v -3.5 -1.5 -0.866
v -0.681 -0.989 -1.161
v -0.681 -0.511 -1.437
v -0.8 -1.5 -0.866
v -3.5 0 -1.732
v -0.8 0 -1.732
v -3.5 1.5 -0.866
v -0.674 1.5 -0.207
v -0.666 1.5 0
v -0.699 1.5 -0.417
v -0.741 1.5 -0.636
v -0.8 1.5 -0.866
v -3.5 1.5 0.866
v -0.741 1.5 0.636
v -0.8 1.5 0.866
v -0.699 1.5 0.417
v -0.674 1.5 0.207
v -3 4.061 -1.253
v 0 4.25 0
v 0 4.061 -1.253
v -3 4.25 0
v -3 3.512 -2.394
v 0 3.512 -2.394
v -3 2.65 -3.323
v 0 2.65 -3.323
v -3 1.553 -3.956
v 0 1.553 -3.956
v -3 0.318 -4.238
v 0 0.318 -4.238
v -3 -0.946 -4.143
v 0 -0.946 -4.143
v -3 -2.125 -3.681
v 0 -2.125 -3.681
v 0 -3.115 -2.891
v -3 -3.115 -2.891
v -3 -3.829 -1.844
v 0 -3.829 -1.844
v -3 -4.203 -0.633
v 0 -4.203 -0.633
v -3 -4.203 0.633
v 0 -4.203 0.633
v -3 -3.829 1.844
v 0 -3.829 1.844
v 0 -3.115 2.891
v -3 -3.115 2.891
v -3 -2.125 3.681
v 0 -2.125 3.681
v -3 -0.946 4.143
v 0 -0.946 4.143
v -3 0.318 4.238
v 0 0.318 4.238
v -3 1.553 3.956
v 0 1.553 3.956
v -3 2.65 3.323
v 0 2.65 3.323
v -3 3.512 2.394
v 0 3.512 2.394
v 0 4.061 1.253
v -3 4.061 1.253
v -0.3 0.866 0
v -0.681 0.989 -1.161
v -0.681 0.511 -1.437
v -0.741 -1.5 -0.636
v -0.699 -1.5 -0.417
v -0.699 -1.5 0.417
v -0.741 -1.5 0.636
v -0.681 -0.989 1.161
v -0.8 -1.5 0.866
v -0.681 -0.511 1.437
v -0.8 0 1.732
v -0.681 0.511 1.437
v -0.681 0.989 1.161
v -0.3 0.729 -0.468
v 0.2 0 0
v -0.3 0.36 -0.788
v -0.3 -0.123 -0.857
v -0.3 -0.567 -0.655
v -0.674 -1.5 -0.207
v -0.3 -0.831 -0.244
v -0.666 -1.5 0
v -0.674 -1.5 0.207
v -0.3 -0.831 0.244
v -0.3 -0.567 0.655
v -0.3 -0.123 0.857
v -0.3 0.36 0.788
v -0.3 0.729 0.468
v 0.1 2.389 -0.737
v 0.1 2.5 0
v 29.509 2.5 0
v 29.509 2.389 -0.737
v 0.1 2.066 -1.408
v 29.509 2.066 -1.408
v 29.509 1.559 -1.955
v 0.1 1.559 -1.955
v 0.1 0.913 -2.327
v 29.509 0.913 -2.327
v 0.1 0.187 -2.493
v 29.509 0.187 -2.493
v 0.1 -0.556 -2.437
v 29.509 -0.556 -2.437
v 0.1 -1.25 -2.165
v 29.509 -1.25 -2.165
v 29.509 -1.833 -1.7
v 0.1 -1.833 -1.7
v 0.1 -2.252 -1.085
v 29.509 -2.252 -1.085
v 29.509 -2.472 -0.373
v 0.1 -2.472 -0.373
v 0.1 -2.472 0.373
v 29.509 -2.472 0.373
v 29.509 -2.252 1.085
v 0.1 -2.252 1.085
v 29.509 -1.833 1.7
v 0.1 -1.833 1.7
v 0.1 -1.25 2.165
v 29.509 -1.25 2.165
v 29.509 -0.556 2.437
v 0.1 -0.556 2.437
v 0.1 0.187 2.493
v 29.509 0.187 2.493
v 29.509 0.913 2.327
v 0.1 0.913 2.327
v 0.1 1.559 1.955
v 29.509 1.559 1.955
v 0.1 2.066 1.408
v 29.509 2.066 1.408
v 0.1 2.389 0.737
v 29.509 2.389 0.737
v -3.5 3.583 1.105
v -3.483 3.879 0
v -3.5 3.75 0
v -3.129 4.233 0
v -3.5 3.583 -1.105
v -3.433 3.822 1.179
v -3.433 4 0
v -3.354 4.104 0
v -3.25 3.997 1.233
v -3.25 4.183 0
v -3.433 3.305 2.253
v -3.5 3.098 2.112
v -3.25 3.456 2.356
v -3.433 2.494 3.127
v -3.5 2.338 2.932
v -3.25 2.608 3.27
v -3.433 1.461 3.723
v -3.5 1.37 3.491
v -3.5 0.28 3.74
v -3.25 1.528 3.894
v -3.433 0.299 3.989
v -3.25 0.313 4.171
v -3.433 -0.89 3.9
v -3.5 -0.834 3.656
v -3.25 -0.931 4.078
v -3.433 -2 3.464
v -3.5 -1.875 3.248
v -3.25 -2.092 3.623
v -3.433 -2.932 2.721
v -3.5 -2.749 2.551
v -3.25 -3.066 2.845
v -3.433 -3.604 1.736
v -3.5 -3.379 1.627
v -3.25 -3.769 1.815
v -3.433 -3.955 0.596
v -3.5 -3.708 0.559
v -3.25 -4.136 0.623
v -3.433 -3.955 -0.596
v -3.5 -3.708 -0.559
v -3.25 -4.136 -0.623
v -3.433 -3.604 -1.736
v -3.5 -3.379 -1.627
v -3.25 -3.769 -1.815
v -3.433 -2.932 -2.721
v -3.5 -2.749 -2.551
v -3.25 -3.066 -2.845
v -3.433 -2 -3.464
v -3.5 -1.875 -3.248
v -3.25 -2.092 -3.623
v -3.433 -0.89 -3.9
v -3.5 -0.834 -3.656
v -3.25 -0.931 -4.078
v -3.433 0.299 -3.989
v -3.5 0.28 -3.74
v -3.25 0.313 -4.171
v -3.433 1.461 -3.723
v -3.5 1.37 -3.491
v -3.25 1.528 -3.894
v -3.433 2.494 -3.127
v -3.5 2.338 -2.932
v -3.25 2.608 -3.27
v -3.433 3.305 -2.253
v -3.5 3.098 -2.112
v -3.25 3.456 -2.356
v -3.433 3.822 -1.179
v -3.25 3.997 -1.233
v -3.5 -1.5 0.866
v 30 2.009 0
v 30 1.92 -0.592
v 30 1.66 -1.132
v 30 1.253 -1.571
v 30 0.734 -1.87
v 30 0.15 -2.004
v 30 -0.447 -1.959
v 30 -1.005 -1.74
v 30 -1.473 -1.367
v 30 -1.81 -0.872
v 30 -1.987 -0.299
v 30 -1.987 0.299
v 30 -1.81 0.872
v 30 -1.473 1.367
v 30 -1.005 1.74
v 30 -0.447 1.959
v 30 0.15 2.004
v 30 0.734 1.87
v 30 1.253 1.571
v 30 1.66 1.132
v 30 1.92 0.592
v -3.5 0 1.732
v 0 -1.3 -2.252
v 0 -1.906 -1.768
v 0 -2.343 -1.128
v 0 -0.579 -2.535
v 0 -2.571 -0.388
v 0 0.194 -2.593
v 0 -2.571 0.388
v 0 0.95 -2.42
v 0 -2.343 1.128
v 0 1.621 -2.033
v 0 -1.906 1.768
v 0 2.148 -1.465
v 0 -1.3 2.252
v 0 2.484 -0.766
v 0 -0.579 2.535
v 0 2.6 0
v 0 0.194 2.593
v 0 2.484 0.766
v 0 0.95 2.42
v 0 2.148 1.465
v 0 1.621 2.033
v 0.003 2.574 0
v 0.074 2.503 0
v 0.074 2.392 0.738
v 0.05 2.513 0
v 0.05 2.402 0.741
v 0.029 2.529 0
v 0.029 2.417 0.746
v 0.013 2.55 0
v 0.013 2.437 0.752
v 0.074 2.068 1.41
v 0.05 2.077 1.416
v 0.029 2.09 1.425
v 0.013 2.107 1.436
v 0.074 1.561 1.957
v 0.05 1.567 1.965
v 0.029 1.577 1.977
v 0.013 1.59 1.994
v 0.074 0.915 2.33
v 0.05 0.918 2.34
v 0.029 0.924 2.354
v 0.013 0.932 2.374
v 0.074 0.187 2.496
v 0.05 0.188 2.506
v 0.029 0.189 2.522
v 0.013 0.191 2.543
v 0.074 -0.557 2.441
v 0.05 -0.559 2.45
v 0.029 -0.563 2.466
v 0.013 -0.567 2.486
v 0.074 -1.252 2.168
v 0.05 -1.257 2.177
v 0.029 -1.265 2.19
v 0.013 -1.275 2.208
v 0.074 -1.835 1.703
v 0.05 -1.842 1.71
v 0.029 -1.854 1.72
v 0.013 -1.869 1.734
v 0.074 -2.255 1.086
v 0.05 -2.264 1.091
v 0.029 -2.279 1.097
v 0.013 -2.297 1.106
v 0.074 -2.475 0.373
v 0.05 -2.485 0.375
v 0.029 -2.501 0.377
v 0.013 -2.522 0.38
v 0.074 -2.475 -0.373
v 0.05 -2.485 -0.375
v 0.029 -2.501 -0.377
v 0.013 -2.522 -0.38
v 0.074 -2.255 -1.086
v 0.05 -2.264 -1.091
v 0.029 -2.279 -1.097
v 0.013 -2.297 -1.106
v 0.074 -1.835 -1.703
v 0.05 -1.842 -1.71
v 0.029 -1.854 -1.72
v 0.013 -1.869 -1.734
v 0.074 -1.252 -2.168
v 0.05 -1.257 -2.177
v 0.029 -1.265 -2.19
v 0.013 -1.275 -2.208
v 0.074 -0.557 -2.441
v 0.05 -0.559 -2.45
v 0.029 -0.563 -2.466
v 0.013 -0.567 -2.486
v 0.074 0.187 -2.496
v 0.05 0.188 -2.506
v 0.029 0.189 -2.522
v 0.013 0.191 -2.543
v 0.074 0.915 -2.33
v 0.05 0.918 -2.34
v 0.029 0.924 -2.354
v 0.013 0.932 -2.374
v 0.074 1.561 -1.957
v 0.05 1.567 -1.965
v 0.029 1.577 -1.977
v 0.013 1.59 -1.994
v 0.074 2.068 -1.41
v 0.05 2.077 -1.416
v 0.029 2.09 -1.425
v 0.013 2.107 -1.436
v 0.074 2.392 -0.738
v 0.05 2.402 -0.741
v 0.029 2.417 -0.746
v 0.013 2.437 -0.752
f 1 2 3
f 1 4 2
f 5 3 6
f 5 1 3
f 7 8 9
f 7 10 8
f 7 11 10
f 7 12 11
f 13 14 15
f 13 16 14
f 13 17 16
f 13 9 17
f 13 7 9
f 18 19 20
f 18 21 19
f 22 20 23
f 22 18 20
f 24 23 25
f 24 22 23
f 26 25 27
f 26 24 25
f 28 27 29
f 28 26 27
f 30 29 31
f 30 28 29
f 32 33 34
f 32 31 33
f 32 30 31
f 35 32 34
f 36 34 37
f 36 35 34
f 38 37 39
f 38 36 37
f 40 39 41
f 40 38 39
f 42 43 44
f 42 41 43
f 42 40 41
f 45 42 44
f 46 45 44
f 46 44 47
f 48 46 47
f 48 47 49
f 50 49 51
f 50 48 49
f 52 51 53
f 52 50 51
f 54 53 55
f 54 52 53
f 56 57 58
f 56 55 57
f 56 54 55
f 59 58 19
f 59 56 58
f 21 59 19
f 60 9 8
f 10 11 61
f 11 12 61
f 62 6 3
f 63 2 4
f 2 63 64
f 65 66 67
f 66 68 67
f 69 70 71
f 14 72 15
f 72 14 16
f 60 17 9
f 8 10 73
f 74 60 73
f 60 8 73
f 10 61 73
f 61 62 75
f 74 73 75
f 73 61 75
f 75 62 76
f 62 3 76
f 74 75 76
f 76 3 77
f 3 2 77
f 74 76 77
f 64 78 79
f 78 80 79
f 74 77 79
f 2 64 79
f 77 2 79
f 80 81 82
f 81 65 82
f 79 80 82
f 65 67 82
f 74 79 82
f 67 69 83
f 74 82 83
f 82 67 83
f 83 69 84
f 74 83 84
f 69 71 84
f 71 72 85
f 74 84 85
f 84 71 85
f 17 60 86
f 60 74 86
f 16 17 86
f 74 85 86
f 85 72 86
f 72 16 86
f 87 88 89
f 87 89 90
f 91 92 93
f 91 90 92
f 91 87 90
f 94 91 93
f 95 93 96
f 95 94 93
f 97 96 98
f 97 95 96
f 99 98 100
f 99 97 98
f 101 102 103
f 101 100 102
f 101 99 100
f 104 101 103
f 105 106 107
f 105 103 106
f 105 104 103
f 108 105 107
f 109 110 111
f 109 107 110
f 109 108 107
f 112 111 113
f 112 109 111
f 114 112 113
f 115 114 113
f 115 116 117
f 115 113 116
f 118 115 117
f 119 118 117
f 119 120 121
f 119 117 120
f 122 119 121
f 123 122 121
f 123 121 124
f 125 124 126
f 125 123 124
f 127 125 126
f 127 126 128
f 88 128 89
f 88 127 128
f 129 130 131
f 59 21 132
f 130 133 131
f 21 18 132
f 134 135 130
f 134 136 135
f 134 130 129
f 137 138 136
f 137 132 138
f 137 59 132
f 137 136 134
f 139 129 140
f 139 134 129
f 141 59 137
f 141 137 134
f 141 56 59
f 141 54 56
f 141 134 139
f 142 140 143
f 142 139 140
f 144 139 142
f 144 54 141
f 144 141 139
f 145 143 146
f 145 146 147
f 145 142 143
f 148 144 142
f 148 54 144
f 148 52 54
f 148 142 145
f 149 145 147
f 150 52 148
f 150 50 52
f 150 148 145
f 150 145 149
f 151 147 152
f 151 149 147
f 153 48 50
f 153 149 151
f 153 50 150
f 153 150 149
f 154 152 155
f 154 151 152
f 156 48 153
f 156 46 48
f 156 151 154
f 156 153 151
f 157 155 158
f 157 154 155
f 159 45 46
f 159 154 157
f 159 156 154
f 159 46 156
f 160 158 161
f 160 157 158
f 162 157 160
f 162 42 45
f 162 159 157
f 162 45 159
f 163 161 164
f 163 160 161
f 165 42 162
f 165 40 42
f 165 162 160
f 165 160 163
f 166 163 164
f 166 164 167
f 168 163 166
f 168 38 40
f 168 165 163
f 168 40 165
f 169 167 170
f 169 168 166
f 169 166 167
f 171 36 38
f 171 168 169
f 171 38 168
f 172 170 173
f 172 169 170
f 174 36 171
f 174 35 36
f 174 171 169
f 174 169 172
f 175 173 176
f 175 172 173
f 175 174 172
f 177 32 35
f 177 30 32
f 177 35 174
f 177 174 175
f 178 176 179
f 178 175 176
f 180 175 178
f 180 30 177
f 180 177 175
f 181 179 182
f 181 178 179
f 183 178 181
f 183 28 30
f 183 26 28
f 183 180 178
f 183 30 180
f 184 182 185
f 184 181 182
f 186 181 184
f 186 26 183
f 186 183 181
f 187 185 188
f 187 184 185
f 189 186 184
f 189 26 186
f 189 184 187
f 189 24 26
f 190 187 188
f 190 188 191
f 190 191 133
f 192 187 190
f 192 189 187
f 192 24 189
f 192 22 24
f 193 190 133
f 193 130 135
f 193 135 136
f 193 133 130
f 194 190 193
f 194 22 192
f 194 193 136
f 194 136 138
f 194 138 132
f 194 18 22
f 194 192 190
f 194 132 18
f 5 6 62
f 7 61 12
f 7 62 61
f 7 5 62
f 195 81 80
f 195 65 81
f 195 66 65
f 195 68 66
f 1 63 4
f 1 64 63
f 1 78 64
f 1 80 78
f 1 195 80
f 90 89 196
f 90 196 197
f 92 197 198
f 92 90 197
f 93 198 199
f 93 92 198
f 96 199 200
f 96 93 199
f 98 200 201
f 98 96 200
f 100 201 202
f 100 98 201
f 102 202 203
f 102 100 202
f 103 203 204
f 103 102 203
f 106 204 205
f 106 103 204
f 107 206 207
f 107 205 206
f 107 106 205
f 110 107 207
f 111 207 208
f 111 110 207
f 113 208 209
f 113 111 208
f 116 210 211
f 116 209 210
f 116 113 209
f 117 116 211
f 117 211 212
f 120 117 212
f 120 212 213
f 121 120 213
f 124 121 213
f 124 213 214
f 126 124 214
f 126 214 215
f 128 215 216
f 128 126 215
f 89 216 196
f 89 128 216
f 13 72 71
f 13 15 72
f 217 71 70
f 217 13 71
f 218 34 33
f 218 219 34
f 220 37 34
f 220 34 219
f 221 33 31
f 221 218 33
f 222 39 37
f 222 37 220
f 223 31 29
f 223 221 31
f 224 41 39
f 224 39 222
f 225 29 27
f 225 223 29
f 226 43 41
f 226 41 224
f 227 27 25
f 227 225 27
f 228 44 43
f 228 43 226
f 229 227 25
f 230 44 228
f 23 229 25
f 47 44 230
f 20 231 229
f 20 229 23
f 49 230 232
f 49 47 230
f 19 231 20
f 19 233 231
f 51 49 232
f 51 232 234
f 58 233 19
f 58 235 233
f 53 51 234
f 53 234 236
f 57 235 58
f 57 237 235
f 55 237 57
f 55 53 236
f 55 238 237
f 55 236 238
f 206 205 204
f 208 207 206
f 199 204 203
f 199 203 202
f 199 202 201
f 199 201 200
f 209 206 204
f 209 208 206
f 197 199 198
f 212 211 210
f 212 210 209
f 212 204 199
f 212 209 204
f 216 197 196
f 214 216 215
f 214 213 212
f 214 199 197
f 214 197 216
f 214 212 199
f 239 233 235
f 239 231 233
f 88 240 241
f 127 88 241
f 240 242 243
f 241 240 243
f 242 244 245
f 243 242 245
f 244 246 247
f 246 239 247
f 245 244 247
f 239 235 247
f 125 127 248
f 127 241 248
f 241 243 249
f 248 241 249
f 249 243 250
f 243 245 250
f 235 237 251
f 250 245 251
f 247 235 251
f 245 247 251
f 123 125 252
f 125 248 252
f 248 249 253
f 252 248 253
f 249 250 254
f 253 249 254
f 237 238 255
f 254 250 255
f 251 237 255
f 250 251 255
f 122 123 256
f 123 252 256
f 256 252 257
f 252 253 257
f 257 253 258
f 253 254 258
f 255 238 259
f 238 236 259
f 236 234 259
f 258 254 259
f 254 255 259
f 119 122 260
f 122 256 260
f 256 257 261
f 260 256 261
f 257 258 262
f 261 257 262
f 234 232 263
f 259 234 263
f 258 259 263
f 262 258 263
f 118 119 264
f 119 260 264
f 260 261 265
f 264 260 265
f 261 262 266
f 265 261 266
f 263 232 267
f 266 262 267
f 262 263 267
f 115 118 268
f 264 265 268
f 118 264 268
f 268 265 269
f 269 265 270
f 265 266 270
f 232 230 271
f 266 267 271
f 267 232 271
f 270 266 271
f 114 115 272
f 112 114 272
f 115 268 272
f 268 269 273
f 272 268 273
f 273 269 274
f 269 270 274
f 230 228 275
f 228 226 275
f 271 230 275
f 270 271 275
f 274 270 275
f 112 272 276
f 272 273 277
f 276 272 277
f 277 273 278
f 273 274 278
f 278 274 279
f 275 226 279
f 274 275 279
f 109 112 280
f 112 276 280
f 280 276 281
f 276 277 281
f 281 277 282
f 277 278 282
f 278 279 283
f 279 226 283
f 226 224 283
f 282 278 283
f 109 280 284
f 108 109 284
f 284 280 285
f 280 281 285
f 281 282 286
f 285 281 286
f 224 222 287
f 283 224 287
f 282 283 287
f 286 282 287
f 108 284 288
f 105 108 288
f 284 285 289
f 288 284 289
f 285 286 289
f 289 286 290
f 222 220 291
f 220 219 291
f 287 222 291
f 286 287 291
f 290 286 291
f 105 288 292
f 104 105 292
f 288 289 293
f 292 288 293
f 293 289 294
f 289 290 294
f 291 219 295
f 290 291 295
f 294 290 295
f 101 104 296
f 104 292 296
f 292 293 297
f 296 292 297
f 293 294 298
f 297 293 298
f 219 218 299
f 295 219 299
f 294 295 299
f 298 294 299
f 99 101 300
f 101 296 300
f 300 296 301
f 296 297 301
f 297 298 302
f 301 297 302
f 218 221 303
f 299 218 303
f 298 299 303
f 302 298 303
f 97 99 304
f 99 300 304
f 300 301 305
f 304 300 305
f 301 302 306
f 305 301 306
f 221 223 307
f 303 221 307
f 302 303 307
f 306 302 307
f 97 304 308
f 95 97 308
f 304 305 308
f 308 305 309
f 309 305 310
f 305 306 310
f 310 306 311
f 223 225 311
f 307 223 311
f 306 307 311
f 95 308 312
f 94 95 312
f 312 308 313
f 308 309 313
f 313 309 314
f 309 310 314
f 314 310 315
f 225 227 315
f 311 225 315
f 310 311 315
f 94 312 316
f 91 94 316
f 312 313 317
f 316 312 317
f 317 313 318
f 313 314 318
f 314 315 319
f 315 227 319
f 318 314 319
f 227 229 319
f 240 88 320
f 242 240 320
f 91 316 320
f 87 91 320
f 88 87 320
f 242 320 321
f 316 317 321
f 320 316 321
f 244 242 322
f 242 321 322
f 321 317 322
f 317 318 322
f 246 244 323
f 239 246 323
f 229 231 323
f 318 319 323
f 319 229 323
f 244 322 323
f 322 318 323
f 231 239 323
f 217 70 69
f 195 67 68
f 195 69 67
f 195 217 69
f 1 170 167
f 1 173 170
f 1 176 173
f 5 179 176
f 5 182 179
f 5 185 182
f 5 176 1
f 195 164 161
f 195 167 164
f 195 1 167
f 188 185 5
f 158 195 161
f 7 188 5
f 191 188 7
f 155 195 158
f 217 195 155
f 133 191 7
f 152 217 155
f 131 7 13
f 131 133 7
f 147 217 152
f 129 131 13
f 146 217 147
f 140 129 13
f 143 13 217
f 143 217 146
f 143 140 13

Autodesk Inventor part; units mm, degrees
ref_plane "YZ Plane" through (0, 0, 0) normal (1, 0, 0) x (0, 1, 0)
ref_plane "XZ Plane" through (0, 0, 0) normal (0, 1, 0) x (-1, 0, 0)
sketch "Sketch1" plane through (0, 0, 0) normal (0, 0, 1) x (1, 0, 0)
  line L0 (0.2, 0) -> (30, 0)
  line L1 (30, 0) -> (30, 2.5)
  line L2 (30, 2.5) -> (14, 2.5)
  line L3 (14, 2.5) -> (13.5091, 2.5)
  line L4 (13.5091, 2.5) -> (0, 2.5)
  line L5 (0, 2.5) -> (0, 4.25)
  line L6 (0, 4.25) -> (-3.5, 4.25)
  line L7 (-3.5, 4.25) -> (-3.5, 1.7321)
  line L8 (-3.5, 1.7321) -> (-0.8, 1.7321)
  line L9 (-0.8, 1.7321) -> (0.2, 0)
  line L10 (-10.2, 0) -> (36.7, 0) projected
  line L11 (0, -0.85) -> (0, 5.1) projected
  line L12 (14, 2.5) -> (0, 2.5) construction
  dimension "d1" = 16
  dimension "d2" = 0.4909
  dimension "d3" = 3.5
  dimension "d4" = 2.7
  dimension "d5" = 60
  dimension "d6" = 5
  dimension "d7" = 5
  dimension "d8" = 3.4641
  dimension "d9" = 8.5
  dimension "d26" = 30
revolve "Body" add sketch "Sketch1" angle 360 about axis through (0.2, 0, 0) along (1, 0, 0) contours L9 L11 L4 L3 L2 L1 L0 | L9 L8 L7 L6 L5 L11
sketch "Sketch2" plane through (-3.5, 0, 0) normal (-1, 0, 0) x (0, 0, 1)
  circle A0 centre (0, 0) radius 1.7321 projected
  line L0 (0, -5.95) -> (0, 5.95) projected
  line L1 (-5.95, 0) -> (5.95, 0) projected
  line L2 (1.7321, 0) -> (0.866, -1.5)
  line L3 (0.866, -1.5) -> (-0.866, -1.5)
  line L4 (-0.866, -1.5) -> (-1.7321, 0)
  line L5 (-1.7321, 0) -> (-0.866, 1.5)
  line L6 (-0.866, 1.5) -> (0.866, 1.5)
  line L7 (0.866, 1.5) -> (1.7321, 0)
extrude "Slot" add sketch "Sketch2" against normal up to next contours L7 A0 | A0 L2 | L6 L0 A0 | A0 L0 L3 | L0 L6 A0 | A0 L3 L0 | L4 A0 | A0 L5
fillet "Fillet1" radius 0.5 1 edges at (-3.5, -4.25, 0)
thread "Thread" size "M5x0.8" class "6g" standard "ISO Metric profile" length 16
chamfer "Chamfer1" distance 0.4908 distance2 0.4908 1 edges at (30, -2.5, 0) measured on face at (30, -0.5525, -0.0341)
ref_plane "Work Plane1" through (29, 0, 0) normal (0, -1, 0) x (1, 0, 0)
fillet "Fillet2" radius 0.1 1 edges at (0, -2.5, 0)
equation "\"d1\" = GEL"
equation "\"d3\" = KOH"
equation "\"d4\" = INTI"
equation "\"d6\" = GD"
equation "\"d7\" = BDM"
equation "\"d8\" = 1.1547 * SW"
equation "\"d9\" = KOD"
equation "\"d26\" = NLG"
equation "\"d30\" = R"
equation "\"d17\" = RR"
equation "\"d13\" = GEL"
equation "\"d15\" = -0.5 * SPD + 0.5 * GD"
equation "\"d16\" = GUL"
equation "\"GD\" = NND"
equation "\"NLG\" = 30"
equation "\"GEL\" = 16"
equation "\"KOD\" = 8.5"
equation "\"KOH\" = 3.5"
equation "\"INTI\" = 2.7"
equation "\"GAL\" = 0.61345 * PTC"
equation "\"GUL\" = 0.61345 * PTC"
equation "\"BDM\" = NND"
equation "\"SW\" = 3"
equation "\"RR\" = 0.5"
equation "\"SPD\" = NND - 1.2269 * PTC"
equation "\"R\" = 0.1"
equation "\"TOA\" = 30deg"
equation "\"GD1\" = THREADDIA - 1.2269 * PTC"
equation "\"THREADDIA\" = 5"
equation "\"FAWI\" = 45deg"
equation "\"ANG\" = 120deg"
equation "\"PTC\" = 0.8"
equation "\"NND\" = 5"
equation "\"E0\" = 1.155 * SW"
properties part number "DIN 7984 - M5 x 30" material "Steel, Mild"
